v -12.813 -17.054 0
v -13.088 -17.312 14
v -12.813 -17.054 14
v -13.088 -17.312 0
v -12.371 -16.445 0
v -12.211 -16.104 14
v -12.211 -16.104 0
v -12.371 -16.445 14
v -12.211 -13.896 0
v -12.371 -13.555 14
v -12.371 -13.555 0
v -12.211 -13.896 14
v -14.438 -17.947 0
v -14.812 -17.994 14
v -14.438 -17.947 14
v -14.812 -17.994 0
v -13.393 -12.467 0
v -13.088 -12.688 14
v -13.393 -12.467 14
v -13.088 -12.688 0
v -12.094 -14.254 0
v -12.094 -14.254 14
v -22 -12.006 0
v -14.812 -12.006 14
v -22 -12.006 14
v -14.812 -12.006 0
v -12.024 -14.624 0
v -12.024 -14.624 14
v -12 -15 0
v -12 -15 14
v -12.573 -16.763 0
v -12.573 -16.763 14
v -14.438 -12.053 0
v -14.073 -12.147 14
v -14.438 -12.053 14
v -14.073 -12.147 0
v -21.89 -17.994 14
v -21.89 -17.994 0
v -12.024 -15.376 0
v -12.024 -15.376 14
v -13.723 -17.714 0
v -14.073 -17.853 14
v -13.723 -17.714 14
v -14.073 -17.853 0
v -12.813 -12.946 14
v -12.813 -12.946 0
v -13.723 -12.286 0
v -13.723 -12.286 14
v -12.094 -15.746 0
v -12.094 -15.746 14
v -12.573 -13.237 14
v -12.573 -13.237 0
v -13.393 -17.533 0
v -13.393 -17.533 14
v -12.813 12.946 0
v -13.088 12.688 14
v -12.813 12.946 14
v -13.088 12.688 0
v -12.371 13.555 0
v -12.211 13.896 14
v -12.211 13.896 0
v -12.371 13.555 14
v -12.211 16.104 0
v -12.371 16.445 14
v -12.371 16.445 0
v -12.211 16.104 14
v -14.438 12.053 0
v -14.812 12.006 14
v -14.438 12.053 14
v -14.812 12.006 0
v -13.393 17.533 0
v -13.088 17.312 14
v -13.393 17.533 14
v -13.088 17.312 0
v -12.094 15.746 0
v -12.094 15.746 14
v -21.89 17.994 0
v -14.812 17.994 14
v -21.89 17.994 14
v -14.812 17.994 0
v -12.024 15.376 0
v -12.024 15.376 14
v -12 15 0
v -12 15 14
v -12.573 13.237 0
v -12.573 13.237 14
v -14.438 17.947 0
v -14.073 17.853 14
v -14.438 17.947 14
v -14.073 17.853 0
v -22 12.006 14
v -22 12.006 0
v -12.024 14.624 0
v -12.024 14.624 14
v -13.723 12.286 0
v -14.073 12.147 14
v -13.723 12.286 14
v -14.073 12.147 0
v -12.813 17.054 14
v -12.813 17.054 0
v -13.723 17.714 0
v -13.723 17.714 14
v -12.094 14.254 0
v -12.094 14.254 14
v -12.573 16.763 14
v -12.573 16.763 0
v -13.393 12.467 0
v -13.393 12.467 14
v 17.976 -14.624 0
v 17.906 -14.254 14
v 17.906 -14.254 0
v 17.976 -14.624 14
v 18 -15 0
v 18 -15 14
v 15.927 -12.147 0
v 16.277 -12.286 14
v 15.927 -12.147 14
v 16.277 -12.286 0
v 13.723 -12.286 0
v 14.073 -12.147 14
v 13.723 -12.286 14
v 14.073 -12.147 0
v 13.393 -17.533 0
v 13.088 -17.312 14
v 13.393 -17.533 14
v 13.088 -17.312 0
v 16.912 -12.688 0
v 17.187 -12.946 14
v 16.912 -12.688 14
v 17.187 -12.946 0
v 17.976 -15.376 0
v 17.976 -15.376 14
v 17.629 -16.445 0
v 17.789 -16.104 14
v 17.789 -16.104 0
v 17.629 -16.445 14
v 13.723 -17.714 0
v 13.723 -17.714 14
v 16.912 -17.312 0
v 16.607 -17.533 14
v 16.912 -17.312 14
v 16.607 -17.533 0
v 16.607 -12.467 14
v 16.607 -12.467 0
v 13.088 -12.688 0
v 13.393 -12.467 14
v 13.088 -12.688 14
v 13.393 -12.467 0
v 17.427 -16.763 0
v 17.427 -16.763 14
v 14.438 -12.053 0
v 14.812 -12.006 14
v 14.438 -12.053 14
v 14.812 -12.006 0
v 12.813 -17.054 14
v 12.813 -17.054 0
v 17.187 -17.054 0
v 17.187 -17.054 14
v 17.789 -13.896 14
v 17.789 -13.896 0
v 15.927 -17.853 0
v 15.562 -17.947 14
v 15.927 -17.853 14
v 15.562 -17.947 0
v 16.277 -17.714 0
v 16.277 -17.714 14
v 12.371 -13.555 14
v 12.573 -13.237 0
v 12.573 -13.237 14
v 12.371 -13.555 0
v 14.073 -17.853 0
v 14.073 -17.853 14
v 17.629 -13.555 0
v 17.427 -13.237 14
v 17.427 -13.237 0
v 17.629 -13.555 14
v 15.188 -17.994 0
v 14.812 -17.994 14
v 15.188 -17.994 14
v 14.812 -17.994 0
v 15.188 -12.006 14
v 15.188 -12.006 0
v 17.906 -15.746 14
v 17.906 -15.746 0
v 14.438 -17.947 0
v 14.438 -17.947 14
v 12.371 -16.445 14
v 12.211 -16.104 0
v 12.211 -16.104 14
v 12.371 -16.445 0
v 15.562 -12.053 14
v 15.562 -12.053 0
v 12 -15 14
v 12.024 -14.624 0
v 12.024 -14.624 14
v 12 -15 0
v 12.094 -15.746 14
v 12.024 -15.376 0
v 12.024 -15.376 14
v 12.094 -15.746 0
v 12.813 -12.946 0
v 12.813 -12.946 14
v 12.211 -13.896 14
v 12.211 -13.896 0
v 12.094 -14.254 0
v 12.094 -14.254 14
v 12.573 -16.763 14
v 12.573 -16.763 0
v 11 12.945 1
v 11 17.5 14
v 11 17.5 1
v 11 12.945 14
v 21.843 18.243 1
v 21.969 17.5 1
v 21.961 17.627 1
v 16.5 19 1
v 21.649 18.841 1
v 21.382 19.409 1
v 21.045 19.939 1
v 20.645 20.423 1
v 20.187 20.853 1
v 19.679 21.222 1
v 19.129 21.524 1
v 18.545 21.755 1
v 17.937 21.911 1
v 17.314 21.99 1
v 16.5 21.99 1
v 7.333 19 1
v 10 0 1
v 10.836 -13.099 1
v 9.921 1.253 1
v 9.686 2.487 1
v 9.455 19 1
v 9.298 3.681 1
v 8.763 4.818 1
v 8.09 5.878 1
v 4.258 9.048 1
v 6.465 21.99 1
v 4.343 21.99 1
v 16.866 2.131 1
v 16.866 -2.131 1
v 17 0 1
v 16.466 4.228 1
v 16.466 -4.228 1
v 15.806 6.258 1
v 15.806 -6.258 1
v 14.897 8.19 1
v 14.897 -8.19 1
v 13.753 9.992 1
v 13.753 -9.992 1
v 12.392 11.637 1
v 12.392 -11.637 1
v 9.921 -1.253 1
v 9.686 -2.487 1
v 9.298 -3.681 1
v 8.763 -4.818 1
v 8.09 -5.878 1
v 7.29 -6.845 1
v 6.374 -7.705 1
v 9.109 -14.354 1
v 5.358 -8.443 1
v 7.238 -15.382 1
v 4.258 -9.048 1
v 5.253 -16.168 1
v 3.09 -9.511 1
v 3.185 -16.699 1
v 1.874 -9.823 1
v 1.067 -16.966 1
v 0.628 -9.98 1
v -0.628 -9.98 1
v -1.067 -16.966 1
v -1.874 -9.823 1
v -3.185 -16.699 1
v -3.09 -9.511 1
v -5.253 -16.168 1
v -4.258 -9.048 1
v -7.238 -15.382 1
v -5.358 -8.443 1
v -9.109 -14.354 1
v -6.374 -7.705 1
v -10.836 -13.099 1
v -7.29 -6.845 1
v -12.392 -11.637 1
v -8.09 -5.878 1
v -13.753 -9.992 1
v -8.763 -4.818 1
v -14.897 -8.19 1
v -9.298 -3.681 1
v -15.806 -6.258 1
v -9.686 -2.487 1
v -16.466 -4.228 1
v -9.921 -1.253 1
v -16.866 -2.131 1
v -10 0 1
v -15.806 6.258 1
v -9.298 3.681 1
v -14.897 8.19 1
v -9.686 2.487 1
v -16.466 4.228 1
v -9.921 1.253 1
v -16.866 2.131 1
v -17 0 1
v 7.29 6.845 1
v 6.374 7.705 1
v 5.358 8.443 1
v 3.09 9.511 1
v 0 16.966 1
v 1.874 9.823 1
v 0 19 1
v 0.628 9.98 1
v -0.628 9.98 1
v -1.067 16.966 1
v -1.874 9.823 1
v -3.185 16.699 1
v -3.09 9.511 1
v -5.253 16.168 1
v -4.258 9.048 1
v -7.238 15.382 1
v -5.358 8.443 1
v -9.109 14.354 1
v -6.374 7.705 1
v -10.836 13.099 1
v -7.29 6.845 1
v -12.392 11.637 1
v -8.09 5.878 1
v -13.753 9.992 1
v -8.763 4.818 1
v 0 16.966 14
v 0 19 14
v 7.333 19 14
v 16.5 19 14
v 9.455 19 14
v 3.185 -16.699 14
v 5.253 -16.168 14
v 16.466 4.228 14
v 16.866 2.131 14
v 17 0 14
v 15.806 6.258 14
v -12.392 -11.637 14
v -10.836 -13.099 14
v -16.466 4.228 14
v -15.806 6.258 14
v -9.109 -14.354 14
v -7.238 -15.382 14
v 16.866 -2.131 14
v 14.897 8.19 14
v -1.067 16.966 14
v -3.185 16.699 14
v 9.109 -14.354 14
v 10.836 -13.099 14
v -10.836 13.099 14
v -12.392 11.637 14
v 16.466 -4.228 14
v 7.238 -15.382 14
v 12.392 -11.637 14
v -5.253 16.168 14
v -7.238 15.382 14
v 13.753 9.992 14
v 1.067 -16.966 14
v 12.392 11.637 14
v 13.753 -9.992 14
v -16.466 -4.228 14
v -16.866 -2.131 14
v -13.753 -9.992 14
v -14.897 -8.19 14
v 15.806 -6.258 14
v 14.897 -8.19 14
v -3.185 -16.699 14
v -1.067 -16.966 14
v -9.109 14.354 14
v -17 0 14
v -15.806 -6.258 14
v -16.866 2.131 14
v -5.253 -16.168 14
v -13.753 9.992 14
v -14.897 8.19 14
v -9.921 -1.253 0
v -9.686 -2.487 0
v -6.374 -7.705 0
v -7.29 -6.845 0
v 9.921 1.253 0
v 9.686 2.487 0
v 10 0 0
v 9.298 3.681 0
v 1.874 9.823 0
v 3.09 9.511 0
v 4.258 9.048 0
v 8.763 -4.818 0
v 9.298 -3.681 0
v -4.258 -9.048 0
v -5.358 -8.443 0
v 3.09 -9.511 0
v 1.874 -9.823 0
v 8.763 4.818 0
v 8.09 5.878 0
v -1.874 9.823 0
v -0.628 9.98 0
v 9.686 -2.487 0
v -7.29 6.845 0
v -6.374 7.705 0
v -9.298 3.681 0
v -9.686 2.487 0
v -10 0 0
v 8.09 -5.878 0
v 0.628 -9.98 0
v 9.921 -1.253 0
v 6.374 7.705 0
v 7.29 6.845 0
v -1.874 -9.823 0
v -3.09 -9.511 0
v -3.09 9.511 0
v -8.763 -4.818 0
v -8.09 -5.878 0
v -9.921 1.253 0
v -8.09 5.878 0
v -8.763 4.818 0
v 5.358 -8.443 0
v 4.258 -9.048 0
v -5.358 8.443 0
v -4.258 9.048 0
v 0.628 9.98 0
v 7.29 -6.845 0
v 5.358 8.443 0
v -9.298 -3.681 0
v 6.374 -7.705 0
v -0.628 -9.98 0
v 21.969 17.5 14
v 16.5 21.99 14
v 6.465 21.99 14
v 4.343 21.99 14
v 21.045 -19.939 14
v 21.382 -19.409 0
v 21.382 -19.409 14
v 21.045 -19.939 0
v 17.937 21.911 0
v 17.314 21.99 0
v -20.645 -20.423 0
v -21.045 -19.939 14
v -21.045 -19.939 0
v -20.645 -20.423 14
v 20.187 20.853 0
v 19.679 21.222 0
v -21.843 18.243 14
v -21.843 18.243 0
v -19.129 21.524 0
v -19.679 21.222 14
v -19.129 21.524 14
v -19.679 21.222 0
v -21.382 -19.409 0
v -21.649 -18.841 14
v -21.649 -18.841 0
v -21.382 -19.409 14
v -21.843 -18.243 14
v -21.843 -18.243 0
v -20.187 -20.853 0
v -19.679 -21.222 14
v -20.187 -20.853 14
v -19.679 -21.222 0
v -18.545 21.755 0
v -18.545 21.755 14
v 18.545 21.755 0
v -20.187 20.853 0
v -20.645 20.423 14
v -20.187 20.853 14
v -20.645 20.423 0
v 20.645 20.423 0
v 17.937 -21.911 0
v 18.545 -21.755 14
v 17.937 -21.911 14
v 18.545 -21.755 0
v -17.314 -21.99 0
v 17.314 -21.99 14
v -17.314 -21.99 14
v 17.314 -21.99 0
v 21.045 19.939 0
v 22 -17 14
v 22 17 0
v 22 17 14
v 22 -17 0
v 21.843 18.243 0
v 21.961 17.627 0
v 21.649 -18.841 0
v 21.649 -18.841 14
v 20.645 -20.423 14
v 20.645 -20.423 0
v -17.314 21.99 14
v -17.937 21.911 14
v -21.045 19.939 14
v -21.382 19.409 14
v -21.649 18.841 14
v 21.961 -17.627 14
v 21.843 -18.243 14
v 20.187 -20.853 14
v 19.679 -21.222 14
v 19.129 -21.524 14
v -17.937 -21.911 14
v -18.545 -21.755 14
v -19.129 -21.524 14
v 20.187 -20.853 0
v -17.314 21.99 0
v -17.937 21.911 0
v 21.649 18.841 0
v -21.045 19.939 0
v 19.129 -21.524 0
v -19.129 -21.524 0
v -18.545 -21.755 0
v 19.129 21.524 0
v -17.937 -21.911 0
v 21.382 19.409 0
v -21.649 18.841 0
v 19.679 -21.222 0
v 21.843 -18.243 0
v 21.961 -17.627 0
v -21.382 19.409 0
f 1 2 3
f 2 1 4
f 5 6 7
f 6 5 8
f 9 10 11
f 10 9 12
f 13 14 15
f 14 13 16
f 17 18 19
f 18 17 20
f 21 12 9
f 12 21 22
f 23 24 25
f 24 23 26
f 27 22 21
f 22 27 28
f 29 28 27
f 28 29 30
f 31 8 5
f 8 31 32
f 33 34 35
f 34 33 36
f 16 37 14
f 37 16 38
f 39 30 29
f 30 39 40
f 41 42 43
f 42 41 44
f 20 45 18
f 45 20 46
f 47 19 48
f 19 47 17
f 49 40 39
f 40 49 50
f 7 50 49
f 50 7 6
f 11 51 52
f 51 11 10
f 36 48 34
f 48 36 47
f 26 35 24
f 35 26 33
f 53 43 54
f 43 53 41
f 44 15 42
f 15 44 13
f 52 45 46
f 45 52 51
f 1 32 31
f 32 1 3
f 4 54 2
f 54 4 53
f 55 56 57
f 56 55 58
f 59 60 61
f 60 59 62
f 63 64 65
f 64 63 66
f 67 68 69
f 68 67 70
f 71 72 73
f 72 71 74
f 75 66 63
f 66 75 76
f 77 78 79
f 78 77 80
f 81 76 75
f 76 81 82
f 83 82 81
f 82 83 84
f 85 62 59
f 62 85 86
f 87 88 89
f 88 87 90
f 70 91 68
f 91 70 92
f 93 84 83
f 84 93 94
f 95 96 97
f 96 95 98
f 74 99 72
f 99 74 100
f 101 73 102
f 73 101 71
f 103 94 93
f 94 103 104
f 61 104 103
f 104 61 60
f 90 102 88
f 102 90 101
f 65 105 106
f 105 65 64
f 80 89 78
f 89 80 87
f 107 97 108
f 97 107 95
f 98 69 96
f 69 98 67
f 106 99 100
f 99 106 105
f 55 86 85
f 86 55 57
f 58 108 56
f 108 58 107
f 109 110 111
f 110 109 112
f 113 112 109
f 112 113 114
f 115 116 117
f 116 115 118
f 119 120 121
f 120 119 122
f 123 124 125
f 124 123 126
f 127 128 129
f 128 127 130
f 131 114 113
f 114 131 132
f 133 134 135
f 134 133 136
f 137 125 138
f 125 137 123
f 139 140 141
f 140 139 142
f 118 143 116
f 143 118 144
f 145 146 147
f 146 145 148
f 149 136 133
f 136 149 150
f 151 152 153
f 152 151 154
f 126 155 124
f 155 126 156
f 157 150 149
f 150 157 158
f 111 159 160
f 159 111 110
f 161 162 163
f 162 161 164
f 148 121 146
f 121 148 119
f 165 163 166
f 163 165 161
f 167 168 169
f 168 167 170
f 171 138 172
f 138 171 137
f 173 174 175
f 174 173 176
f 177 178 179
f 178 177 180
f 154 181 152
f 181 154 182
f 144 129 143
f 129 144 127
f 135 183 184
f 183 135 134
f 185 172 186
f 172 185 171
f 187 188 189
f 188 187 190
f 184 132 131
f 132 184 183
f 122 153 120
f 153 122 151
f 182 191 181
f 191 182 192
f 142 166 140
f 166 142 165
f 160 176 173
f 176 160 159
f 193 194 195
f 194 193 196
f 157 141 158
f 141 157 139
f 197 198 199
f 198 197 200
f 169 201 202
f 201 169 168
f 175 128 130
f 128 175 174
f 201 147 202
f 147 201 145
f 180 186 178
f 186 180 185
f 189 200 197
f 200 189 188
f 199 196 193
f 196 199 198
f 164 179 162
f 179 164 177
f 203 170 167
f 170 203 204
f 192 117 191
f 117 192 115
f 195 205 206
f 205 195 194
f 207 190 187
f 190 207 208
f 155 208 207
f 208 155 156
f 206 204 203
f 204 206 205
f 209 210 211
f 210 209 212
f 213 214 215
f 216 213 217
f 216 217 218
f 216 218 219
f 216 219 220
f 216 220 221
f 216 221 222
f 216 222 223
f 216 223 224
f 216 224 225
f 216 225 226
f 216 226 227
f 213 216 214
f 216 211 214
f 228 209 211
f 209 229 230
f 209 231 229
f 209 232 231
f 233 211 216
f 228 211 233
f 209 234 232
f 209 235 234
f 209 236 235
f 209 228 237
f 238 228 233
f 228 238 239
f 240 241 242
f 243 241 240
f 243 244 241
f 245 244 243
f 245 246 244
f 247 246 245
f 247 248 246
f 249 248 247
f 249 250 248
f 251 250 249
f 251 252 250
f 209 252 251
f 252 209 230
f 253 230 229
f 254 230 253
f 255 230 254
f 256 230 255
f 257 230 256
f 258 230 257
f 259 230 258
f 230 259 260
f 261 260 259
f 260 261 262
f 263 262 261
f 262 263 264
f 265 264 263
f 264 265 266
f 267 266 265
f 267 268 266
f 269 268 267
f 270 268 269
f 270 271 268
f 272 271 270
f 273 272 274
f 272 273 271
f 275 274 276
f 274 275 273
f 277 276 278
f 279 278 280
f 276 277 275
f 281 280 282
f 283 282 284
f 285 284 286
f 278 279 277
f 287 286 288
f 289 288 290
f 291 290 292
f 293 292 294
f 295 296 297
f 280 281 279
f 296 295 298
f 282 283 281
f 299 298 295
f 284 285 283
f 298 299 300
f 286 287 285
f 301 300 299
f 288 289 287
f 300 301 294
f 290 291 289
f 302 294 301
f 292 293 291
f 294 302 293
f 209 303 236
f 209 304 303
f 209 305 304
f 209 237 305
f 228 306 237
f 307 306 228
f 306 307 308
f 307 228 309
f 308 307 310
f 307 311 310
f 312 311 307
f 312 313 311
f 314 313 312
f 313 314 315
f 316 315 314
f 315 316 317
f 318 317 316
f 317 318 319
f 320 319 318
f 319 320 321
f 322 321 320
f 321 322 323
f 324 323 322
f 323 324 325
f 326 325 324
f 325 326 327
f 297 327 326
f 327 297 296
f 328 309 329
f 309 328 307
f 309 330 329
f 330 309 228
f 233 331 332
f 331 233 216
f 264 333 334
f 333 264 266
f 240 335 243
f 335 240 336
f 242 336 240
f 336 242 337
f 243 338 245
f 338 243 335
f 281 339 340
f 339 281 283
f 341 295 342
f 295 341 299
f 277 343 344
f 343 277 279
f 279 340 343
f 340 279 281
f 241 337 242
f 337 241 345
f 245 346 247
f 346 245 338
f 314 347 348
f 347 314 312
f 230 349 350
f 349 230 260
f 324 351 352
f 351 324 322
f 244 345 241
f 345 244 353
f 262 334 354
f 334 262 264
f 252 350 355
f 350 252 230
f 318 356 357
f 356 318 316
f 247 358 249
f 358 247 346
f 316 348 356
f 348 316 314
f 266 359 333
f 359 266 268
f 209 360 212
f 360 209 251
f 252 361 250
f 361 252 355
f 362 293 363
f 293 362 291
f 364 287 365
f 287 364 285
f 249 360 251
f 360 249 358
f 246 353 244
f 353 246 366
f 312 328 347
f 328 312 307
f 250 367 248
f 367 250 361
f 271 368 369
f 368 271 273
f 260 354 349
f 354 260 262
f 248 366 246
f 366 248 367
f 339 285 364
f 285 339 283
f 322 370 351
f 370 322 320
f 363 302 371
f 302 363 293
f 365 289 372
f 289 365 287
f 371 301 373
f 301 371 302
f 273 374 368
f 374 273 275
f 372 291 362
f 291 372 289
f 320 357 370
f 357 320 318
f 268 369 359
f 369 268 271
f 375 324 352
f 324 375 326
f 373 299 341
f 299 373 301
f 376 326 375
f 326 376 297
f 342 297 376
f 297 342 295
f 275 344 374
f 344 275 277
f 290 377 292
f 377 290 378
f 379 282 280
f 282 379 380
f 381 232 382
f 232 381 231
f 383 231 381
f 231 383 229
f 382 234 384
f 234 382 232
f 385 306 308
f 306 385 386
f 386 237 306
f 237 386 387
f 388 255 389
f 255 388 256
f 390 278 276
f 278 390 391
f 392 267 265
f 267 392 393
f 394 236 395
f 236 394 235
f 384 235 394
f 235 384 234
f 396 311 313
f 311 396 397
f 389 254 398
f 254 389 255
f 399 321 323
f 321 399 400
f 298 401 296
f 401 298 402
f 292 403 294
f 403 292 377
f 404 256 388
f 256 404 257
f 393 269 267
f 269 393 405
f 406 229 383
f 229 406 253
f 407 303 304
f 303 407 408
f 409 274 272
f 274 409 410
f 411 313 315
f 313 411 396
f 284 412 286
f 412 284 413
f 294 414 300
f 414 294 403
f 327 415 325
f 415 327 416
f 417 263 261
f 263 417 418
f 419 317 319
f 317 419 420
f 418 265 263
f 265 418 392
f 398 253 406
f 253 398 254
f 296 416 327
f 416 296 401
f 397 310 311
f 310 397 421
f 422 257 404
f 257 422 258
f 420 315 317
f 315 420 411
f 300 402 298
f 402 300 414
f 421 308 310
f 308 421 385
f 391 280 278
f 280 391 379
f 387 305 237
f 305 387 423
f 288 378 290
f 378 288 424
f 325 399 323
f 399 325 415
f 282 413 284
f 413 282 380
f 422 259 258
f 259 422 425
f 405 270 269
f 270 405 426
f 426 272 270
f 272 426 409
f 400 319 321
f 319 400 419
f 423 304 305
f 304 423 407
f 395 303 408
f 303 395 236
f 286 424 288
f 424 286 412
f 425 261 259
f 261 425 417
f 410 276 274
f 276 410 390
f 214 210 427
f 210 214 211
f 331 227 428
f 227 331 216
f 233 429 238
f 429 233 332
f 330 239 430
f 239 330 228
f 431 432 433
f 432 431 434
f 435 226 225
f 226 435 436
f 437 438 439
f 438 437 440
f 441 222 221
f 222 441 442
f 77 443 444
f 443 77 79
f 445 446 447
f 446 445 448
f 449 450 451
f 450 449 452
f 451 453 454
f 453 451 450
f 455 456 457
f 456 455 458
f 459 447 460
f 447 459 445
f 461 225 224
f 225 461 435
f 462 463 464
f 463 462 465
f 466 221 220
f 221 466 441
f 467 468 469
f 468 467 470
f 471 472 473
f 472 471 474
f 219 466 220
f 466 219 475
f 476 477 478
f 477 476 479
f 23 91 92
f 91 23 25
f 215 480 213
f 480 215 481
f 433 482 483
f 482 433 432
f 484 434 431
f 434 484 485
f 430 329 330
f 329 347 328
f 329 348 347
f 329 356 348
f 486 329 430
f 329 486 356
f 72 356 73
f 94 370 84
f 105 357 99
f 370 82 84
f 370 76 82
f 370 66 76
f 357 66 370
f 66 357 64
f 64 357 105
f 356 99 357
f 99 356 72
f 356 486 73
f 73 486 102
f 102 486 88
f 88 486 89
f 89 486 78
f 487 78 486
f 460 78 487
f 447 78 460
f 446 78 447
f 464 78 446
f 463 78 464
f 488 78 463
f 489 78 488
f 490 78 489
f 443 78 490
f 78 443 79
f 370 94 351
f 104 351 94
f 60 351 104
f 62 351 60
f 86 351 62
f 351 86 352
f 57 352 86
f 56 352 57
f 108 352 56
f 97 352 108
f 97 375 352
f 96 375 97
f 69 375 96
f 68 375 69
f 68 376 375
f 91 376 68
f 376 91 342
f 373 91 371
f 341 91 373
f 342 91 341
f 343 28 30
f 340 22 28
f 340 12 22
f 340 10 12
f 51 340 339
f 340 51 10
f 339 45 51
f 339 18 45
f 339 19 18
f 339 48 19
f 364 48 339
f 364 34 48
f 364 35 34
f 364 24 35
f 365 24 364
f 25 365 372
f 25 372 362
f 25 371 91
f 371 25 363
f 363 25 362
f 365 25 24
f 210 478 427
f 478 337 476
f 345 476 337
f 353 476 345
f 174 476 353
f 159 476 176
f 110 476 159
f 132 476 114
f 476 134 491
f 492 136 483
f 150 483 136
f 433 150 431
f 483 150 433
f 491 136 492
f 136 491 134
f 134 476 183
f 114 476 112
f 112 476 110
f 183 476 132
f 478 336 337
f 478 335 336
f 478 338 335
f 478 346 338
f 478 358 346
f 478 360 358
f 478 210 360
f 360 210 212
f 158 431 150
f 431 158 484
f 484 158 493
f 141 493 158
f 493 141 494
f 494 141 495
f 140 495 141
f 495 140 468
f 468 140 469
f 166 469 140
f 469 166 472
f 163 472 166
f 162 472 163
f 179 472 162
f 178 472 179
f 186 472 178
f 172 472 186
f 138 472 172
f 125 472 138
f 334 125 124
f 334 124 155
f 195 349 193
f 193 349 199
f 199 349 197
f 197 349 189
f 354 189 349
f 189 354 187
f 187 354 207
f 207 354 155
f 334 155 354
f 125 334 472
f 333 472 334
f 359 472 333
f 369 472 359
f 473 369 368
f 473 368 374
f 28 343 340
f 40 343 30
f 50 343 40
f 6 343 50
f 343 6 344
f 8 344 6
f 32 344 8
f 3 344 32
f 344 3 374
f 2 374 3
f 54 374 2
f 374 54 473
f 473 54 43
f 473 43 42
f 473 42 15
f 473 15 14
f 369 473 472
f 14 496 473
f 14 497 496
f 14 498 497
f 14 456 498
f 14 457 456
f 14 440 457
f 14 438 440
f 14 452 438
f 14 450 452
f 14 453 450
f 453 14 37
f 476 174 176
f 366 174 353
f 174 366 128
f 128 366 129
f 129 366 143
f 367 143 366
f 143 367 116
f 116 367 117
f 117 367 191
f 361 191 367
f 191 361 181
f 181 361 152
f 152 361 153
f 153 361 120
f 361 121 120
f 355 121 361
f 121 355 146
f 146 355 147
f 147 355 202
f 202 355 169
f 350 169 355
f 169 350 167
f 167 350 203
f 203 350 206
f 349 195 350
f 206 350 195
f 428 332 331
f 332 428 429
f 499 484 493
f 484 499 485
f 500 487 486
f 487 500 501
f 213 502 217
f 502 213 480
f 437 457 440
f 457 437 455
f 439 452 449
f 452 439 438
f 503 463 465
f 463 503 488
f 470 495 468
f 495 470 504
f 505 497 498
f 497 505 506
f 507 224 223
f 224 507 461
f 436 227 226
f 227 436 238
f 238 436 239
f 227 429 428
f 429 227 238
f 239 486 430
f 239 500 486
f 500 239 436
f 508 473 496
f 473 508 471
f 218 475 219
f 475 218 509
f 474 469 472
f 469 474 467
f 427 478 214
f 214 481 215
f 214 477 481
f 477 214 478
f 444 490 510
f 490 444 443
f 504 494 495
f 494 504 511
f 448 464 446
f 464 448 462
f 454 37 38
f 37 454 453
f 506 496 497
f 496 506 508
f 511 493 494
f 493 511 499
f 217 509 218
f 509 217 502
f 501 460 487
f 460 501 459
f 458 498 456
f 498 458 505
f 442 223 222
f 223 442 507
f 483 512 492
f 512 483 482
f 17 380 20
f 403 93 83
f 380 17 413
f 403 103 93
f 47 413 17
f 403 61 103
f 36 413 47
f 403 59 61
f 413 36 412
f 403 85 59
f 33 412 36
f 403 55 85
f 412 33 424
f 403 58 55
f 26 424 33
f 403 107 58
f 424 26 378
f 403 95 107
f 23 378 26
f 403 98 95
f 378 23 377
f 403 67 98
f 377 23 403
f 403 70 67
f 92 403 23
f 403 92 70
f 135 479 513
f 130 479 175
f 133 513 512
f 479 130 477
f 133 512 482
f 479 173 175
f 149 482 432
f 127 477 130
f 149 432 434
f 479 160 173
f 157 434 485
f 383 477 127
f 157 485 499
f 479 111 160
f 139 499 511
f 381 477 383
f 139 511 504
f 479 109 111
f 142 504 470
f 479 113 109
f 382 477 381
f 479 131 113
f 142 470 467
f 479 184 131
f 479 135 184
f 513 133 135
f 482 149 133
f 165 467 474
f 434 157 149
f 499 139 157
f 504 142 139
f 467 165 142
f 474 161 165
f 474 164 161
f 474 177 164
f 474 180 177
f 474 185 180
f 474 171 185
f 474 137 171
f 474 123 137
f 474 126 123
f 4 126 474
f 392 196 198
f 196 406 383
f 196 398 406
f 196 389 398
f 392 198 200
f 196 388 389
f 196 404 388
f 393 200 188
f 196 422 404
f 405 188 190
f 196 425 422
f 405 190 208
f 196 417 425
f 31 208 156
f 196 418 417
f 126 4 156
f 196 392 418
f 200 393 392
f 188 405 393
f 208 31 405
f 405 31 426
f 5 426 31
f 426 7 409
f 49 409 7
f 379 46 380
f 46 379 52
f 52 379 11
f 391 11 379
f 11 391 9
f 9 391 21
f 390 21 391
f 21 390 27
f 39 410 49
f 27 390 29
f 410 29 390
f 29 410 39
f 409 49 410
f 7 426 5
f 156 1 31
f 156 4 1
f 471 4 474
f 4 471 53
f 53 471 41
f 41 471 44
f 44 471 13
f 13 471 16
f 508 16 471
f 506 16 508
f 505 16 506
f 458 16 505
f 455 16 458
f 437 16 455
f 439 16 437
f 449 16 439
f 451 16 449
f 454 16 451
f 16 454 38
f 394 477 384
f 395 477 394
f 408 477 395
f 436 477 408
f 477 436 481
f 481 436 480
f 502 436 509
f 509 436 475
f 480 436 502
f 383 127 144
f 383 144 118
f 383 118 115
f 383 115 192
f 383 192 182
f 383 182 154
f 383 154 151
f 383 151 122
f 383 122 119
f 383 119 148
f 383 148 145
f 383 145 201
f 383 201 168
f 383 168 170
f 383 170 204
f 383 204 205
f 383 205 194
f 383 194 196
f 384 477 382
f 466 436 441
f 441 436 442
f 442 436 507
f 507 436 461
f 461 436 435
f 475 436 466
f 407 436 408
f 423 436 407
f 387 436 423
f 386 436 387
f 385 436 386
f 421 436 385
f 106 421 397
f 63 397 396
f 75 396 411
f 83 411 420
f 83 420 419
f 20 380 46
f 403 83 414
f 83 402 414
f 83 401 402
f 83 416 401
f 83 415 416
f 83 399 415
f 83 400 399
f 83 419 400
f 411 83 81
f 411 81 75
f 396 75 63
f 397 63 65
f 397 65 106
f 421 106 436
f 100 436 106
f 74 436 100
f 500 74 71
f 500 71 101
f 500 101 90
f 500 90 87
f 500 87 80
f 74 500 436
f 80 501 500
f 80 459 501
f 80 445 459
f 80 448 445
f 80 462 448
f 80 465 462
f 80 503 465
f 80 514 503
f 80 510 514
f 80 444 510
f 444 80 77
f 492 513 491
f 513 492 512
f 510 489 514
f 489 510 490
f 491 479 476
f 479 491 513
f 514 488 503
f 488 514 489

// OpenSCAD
$fn = 50;


difference() {
	union() {
		translate(v = [0, 0, 0]) {
			rotate(a = [0, 0, 0]) {
				hull() {
					translate(v = [-17.0000000000, 17.0000000000, 0]) {
						rotate(a = [0, 0, 0]) {
							translate(v = [0, 0, 0]) {
								rotate(a = [0, 0, 0]) {
									cylinder(h = 14, r = 5);
								}
							}
						}
					}
					translate(v = [17.0000000000, 17.0000000000, 0]) {
						rotate(a = [0, 0, 0]) {
							translate(v = [0, 0, 0]) {
								rotate(a = [0, 0, 0]) {
									cylinder(h = 14, r = 5);
								}
							}
						}
					}
					translate(v = [-17.0000000000, -17.0000000000, 0]) {
						rotate(a = [0, 0, 0]) {
							translate(v = [0, 0, 0]) {
								rotate(a = [0, 0, 0]) {
									cylinder(h = 14, r = 5);
								}
							}
						}
					}
					translate(v = [17.0000000000, -17.0000000000, 0]) {
						rotate(a = [0, 0, 0]) {
							translate(v = [0, 0, 0]) {
								rotate(a = [0, 0, 0]) {
									cylinder(h = 14, r = 5);
								}
							}
						}
					}
				}
			}
		}
	}
	union() {
		translate(v = [-22.5000000000, -15.0000000000, -125]) {
			rotate(a = [0, 0, 0]) {
				hull() {
					translate(v = [7.5000000000, 0, 0]) {
						rotate(a = [0, 0, 0]) {
							translate(v = [0, 0, 0]) {
								rotate(a = [0, 0, 0]) {
									cylinder(h = 250, r = 3.0000000000);
								}
							}
						}
					}
					translate(v = [-7.5000000000, 0, 0]) {
						rotate(a = [0, 0, 0]) {
							translate(v = [0, 0, 0]) {
								rotate(a = [0, 0, 0]) {
									cylinder(h = 250, r = 3.0000000000);
								}
							}
						}
					}
				}
			}
		}
		translate(v = [-22.5000000000, 15.0000000000, -125]) {
			rotate(a = [0, 0, 0]) {
				hull() {
					translate(v = [7.5000000000, 0, 0]) {
						rotate(a = [0, 0, 0]) {
							translate(v = [0, 0, 0]) {
								rotate(a = [0, 0, 0]) {
									cylinder(h = 250, r = 3.0000000000);
								}
							}
						}
					}
					translate(v = [-7.5000000000, 0, 0]) {
						rotate(a = [0, 0, 0]) {
							translate(v = [0, 0, 0]) {
								rotate(a = [0, 0, 0]) {
									cylinder(h = 250, r = 3.0000000000);
								}
							}
						}
					}
				}
			}
		}
		translate(v = [15.0000000000, -15.0000000000, -125.0000000000]) {
			rotate(a = [0, 0, 0]) {
				cylinder(h = 250, r = 3.0000000000);
			}
		}
		translate(v = [0.0000000000, 11.0000000000, 1.0000000000]) {
			rotate(a = [0, 0, 0]) {
				cube(size = [11, 8, 16]);
			}
		}
		translate(v = [0, 0, 1.0000000000]) {
			rotate(a = [0, 0, 0]) {
				cylinder(h = 16, r = 17.0000000000);
			}
		}
		translate(v = [0, 0, -7.0000000000]) {
			rotate(a = [0, 0, 0]) {
				cylinder(h = 14, r = 10.0000000000);
			}
		}
		translate(v = [0.0000000000, 17.5000000000, 1]) {
			rotate(a = [0, 0, 0]) {
				cube(size = [22.0000000000, 1.5000000000, 16]);
			}
		}
		translate(v = [16.5000000000, 17.5000000000, 1]) {
			rotate(a = [0, 0, 0]) {
				cube(size = [5.5000000000, 4.5000000000, 16]);
			}
		}
		translate(v = [3.5833333333, 22.7500000000, 1]) {
			rotate(a = [0, 0, -45]) {
				cube(size = [7.5000000000, 1.5000000000, 16]);
			}
		}
	}
}
